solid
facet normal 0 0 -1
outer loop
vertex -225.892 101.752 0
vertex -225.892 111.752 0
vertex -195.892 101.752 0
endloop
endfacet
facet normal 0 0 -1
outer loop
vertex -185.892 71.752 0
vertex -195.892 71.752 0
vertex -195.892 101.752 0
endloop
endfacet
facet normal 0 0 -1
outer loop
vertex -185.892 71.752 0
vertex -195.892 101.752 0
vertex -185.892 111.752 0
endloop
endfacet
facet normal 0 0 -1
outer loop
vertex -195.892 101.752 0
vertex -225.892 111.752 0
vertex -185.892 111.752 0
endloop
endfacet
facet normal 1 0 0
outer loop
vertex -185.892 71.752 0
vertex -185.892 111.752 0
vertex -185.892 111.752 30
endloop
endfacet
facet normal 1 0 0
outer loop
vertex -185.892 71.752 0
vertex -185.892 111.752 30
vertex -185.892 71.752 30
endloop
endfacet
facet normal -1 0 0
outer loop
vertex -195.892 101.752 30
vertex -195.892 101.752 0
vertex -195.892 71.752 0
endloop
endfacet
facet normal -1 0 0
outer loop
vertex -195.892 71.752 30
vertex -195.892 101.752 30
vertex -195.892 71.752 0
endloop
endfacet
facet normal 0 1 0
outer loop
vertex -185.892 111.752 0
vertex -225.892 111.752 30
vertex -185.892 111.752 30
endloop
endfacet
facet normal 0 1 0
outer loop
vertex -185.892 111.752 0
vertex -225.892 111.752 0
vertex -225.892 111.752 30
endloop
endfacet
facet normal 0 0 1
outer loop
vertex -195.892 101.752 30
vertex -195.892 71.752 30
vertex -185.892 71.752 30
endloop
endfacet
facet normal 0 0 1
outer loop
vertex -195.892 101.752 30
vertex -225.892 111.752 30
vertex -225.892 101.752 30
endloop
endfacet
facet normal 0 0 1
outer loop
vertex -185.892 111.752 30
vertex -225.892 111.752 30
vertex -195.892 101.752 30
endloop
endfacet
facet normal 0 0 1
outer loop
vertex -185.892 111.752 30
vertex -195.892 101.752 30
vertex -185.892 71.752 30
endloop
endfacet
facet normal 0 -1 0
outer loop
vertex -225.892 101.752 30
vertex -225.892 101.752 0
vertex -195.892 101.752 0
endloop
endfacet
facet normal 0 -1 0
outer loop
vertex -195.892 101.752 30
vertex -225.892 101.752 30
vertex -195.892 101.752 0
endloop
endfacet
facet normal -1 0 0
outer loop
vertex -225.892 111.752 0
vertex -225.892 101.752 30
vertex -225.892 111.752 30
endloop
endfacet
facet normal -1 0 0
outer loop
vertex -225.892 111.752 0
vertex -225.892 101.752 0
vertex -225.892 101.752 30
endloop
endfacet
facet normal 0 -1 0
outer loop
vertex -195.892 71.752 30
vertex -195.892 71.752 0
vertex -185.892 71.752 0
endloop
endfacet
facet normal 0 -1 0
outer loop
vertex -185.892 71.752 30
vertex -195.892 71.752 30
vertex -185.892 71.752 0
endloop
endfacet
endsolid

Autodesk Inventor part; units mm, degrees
ref_plane "YZ Plane" through (0, 0, 0) normal (1, 0, 0) x (0, 1, 0)
ref_plane "XZ Plane" through (0, 0, 0) normal (0, 1, 0) x (-1, 0, 0)
ref_plane "XY Plane" through (0, 0, 0) normal (0, 0, 1) x (1, 0, 0)
sketch "Boceto1" plane through (0, 0, 0) normal (0, 0, 1) x (1, 0, 0)
  line L0 (-225.8925, 111.7519) -> (-185.8925, 111.7519)
  line L1 (-185.8925, 111.7519) -> (-185.8925, 71.7519)
  line L2 (-225.8925, 101.7519) -> (-195.8925, 101.7519)
  line L3 (-195.8925, 101.7519) -> (-195.8925, 71.7519)
  line L4 (-225.8925, 101.7519) -> (-225.8925, 111.7519)
  line L5 (-195.8925, 71.7519) -> (-185.8925, 71.7519)
  point P0 (0, 0)
  point P1 (0, 4.2735)
  dimension "d1" = 10
  dimension "d3" = 10
  dimension "d4" = 30
  dimension "d7" = 40
extrude "Extrusión1" add sketch "Boceto1" along normal blind 30
properties part number "Tope_Extremos" material "Plástico ABS"
